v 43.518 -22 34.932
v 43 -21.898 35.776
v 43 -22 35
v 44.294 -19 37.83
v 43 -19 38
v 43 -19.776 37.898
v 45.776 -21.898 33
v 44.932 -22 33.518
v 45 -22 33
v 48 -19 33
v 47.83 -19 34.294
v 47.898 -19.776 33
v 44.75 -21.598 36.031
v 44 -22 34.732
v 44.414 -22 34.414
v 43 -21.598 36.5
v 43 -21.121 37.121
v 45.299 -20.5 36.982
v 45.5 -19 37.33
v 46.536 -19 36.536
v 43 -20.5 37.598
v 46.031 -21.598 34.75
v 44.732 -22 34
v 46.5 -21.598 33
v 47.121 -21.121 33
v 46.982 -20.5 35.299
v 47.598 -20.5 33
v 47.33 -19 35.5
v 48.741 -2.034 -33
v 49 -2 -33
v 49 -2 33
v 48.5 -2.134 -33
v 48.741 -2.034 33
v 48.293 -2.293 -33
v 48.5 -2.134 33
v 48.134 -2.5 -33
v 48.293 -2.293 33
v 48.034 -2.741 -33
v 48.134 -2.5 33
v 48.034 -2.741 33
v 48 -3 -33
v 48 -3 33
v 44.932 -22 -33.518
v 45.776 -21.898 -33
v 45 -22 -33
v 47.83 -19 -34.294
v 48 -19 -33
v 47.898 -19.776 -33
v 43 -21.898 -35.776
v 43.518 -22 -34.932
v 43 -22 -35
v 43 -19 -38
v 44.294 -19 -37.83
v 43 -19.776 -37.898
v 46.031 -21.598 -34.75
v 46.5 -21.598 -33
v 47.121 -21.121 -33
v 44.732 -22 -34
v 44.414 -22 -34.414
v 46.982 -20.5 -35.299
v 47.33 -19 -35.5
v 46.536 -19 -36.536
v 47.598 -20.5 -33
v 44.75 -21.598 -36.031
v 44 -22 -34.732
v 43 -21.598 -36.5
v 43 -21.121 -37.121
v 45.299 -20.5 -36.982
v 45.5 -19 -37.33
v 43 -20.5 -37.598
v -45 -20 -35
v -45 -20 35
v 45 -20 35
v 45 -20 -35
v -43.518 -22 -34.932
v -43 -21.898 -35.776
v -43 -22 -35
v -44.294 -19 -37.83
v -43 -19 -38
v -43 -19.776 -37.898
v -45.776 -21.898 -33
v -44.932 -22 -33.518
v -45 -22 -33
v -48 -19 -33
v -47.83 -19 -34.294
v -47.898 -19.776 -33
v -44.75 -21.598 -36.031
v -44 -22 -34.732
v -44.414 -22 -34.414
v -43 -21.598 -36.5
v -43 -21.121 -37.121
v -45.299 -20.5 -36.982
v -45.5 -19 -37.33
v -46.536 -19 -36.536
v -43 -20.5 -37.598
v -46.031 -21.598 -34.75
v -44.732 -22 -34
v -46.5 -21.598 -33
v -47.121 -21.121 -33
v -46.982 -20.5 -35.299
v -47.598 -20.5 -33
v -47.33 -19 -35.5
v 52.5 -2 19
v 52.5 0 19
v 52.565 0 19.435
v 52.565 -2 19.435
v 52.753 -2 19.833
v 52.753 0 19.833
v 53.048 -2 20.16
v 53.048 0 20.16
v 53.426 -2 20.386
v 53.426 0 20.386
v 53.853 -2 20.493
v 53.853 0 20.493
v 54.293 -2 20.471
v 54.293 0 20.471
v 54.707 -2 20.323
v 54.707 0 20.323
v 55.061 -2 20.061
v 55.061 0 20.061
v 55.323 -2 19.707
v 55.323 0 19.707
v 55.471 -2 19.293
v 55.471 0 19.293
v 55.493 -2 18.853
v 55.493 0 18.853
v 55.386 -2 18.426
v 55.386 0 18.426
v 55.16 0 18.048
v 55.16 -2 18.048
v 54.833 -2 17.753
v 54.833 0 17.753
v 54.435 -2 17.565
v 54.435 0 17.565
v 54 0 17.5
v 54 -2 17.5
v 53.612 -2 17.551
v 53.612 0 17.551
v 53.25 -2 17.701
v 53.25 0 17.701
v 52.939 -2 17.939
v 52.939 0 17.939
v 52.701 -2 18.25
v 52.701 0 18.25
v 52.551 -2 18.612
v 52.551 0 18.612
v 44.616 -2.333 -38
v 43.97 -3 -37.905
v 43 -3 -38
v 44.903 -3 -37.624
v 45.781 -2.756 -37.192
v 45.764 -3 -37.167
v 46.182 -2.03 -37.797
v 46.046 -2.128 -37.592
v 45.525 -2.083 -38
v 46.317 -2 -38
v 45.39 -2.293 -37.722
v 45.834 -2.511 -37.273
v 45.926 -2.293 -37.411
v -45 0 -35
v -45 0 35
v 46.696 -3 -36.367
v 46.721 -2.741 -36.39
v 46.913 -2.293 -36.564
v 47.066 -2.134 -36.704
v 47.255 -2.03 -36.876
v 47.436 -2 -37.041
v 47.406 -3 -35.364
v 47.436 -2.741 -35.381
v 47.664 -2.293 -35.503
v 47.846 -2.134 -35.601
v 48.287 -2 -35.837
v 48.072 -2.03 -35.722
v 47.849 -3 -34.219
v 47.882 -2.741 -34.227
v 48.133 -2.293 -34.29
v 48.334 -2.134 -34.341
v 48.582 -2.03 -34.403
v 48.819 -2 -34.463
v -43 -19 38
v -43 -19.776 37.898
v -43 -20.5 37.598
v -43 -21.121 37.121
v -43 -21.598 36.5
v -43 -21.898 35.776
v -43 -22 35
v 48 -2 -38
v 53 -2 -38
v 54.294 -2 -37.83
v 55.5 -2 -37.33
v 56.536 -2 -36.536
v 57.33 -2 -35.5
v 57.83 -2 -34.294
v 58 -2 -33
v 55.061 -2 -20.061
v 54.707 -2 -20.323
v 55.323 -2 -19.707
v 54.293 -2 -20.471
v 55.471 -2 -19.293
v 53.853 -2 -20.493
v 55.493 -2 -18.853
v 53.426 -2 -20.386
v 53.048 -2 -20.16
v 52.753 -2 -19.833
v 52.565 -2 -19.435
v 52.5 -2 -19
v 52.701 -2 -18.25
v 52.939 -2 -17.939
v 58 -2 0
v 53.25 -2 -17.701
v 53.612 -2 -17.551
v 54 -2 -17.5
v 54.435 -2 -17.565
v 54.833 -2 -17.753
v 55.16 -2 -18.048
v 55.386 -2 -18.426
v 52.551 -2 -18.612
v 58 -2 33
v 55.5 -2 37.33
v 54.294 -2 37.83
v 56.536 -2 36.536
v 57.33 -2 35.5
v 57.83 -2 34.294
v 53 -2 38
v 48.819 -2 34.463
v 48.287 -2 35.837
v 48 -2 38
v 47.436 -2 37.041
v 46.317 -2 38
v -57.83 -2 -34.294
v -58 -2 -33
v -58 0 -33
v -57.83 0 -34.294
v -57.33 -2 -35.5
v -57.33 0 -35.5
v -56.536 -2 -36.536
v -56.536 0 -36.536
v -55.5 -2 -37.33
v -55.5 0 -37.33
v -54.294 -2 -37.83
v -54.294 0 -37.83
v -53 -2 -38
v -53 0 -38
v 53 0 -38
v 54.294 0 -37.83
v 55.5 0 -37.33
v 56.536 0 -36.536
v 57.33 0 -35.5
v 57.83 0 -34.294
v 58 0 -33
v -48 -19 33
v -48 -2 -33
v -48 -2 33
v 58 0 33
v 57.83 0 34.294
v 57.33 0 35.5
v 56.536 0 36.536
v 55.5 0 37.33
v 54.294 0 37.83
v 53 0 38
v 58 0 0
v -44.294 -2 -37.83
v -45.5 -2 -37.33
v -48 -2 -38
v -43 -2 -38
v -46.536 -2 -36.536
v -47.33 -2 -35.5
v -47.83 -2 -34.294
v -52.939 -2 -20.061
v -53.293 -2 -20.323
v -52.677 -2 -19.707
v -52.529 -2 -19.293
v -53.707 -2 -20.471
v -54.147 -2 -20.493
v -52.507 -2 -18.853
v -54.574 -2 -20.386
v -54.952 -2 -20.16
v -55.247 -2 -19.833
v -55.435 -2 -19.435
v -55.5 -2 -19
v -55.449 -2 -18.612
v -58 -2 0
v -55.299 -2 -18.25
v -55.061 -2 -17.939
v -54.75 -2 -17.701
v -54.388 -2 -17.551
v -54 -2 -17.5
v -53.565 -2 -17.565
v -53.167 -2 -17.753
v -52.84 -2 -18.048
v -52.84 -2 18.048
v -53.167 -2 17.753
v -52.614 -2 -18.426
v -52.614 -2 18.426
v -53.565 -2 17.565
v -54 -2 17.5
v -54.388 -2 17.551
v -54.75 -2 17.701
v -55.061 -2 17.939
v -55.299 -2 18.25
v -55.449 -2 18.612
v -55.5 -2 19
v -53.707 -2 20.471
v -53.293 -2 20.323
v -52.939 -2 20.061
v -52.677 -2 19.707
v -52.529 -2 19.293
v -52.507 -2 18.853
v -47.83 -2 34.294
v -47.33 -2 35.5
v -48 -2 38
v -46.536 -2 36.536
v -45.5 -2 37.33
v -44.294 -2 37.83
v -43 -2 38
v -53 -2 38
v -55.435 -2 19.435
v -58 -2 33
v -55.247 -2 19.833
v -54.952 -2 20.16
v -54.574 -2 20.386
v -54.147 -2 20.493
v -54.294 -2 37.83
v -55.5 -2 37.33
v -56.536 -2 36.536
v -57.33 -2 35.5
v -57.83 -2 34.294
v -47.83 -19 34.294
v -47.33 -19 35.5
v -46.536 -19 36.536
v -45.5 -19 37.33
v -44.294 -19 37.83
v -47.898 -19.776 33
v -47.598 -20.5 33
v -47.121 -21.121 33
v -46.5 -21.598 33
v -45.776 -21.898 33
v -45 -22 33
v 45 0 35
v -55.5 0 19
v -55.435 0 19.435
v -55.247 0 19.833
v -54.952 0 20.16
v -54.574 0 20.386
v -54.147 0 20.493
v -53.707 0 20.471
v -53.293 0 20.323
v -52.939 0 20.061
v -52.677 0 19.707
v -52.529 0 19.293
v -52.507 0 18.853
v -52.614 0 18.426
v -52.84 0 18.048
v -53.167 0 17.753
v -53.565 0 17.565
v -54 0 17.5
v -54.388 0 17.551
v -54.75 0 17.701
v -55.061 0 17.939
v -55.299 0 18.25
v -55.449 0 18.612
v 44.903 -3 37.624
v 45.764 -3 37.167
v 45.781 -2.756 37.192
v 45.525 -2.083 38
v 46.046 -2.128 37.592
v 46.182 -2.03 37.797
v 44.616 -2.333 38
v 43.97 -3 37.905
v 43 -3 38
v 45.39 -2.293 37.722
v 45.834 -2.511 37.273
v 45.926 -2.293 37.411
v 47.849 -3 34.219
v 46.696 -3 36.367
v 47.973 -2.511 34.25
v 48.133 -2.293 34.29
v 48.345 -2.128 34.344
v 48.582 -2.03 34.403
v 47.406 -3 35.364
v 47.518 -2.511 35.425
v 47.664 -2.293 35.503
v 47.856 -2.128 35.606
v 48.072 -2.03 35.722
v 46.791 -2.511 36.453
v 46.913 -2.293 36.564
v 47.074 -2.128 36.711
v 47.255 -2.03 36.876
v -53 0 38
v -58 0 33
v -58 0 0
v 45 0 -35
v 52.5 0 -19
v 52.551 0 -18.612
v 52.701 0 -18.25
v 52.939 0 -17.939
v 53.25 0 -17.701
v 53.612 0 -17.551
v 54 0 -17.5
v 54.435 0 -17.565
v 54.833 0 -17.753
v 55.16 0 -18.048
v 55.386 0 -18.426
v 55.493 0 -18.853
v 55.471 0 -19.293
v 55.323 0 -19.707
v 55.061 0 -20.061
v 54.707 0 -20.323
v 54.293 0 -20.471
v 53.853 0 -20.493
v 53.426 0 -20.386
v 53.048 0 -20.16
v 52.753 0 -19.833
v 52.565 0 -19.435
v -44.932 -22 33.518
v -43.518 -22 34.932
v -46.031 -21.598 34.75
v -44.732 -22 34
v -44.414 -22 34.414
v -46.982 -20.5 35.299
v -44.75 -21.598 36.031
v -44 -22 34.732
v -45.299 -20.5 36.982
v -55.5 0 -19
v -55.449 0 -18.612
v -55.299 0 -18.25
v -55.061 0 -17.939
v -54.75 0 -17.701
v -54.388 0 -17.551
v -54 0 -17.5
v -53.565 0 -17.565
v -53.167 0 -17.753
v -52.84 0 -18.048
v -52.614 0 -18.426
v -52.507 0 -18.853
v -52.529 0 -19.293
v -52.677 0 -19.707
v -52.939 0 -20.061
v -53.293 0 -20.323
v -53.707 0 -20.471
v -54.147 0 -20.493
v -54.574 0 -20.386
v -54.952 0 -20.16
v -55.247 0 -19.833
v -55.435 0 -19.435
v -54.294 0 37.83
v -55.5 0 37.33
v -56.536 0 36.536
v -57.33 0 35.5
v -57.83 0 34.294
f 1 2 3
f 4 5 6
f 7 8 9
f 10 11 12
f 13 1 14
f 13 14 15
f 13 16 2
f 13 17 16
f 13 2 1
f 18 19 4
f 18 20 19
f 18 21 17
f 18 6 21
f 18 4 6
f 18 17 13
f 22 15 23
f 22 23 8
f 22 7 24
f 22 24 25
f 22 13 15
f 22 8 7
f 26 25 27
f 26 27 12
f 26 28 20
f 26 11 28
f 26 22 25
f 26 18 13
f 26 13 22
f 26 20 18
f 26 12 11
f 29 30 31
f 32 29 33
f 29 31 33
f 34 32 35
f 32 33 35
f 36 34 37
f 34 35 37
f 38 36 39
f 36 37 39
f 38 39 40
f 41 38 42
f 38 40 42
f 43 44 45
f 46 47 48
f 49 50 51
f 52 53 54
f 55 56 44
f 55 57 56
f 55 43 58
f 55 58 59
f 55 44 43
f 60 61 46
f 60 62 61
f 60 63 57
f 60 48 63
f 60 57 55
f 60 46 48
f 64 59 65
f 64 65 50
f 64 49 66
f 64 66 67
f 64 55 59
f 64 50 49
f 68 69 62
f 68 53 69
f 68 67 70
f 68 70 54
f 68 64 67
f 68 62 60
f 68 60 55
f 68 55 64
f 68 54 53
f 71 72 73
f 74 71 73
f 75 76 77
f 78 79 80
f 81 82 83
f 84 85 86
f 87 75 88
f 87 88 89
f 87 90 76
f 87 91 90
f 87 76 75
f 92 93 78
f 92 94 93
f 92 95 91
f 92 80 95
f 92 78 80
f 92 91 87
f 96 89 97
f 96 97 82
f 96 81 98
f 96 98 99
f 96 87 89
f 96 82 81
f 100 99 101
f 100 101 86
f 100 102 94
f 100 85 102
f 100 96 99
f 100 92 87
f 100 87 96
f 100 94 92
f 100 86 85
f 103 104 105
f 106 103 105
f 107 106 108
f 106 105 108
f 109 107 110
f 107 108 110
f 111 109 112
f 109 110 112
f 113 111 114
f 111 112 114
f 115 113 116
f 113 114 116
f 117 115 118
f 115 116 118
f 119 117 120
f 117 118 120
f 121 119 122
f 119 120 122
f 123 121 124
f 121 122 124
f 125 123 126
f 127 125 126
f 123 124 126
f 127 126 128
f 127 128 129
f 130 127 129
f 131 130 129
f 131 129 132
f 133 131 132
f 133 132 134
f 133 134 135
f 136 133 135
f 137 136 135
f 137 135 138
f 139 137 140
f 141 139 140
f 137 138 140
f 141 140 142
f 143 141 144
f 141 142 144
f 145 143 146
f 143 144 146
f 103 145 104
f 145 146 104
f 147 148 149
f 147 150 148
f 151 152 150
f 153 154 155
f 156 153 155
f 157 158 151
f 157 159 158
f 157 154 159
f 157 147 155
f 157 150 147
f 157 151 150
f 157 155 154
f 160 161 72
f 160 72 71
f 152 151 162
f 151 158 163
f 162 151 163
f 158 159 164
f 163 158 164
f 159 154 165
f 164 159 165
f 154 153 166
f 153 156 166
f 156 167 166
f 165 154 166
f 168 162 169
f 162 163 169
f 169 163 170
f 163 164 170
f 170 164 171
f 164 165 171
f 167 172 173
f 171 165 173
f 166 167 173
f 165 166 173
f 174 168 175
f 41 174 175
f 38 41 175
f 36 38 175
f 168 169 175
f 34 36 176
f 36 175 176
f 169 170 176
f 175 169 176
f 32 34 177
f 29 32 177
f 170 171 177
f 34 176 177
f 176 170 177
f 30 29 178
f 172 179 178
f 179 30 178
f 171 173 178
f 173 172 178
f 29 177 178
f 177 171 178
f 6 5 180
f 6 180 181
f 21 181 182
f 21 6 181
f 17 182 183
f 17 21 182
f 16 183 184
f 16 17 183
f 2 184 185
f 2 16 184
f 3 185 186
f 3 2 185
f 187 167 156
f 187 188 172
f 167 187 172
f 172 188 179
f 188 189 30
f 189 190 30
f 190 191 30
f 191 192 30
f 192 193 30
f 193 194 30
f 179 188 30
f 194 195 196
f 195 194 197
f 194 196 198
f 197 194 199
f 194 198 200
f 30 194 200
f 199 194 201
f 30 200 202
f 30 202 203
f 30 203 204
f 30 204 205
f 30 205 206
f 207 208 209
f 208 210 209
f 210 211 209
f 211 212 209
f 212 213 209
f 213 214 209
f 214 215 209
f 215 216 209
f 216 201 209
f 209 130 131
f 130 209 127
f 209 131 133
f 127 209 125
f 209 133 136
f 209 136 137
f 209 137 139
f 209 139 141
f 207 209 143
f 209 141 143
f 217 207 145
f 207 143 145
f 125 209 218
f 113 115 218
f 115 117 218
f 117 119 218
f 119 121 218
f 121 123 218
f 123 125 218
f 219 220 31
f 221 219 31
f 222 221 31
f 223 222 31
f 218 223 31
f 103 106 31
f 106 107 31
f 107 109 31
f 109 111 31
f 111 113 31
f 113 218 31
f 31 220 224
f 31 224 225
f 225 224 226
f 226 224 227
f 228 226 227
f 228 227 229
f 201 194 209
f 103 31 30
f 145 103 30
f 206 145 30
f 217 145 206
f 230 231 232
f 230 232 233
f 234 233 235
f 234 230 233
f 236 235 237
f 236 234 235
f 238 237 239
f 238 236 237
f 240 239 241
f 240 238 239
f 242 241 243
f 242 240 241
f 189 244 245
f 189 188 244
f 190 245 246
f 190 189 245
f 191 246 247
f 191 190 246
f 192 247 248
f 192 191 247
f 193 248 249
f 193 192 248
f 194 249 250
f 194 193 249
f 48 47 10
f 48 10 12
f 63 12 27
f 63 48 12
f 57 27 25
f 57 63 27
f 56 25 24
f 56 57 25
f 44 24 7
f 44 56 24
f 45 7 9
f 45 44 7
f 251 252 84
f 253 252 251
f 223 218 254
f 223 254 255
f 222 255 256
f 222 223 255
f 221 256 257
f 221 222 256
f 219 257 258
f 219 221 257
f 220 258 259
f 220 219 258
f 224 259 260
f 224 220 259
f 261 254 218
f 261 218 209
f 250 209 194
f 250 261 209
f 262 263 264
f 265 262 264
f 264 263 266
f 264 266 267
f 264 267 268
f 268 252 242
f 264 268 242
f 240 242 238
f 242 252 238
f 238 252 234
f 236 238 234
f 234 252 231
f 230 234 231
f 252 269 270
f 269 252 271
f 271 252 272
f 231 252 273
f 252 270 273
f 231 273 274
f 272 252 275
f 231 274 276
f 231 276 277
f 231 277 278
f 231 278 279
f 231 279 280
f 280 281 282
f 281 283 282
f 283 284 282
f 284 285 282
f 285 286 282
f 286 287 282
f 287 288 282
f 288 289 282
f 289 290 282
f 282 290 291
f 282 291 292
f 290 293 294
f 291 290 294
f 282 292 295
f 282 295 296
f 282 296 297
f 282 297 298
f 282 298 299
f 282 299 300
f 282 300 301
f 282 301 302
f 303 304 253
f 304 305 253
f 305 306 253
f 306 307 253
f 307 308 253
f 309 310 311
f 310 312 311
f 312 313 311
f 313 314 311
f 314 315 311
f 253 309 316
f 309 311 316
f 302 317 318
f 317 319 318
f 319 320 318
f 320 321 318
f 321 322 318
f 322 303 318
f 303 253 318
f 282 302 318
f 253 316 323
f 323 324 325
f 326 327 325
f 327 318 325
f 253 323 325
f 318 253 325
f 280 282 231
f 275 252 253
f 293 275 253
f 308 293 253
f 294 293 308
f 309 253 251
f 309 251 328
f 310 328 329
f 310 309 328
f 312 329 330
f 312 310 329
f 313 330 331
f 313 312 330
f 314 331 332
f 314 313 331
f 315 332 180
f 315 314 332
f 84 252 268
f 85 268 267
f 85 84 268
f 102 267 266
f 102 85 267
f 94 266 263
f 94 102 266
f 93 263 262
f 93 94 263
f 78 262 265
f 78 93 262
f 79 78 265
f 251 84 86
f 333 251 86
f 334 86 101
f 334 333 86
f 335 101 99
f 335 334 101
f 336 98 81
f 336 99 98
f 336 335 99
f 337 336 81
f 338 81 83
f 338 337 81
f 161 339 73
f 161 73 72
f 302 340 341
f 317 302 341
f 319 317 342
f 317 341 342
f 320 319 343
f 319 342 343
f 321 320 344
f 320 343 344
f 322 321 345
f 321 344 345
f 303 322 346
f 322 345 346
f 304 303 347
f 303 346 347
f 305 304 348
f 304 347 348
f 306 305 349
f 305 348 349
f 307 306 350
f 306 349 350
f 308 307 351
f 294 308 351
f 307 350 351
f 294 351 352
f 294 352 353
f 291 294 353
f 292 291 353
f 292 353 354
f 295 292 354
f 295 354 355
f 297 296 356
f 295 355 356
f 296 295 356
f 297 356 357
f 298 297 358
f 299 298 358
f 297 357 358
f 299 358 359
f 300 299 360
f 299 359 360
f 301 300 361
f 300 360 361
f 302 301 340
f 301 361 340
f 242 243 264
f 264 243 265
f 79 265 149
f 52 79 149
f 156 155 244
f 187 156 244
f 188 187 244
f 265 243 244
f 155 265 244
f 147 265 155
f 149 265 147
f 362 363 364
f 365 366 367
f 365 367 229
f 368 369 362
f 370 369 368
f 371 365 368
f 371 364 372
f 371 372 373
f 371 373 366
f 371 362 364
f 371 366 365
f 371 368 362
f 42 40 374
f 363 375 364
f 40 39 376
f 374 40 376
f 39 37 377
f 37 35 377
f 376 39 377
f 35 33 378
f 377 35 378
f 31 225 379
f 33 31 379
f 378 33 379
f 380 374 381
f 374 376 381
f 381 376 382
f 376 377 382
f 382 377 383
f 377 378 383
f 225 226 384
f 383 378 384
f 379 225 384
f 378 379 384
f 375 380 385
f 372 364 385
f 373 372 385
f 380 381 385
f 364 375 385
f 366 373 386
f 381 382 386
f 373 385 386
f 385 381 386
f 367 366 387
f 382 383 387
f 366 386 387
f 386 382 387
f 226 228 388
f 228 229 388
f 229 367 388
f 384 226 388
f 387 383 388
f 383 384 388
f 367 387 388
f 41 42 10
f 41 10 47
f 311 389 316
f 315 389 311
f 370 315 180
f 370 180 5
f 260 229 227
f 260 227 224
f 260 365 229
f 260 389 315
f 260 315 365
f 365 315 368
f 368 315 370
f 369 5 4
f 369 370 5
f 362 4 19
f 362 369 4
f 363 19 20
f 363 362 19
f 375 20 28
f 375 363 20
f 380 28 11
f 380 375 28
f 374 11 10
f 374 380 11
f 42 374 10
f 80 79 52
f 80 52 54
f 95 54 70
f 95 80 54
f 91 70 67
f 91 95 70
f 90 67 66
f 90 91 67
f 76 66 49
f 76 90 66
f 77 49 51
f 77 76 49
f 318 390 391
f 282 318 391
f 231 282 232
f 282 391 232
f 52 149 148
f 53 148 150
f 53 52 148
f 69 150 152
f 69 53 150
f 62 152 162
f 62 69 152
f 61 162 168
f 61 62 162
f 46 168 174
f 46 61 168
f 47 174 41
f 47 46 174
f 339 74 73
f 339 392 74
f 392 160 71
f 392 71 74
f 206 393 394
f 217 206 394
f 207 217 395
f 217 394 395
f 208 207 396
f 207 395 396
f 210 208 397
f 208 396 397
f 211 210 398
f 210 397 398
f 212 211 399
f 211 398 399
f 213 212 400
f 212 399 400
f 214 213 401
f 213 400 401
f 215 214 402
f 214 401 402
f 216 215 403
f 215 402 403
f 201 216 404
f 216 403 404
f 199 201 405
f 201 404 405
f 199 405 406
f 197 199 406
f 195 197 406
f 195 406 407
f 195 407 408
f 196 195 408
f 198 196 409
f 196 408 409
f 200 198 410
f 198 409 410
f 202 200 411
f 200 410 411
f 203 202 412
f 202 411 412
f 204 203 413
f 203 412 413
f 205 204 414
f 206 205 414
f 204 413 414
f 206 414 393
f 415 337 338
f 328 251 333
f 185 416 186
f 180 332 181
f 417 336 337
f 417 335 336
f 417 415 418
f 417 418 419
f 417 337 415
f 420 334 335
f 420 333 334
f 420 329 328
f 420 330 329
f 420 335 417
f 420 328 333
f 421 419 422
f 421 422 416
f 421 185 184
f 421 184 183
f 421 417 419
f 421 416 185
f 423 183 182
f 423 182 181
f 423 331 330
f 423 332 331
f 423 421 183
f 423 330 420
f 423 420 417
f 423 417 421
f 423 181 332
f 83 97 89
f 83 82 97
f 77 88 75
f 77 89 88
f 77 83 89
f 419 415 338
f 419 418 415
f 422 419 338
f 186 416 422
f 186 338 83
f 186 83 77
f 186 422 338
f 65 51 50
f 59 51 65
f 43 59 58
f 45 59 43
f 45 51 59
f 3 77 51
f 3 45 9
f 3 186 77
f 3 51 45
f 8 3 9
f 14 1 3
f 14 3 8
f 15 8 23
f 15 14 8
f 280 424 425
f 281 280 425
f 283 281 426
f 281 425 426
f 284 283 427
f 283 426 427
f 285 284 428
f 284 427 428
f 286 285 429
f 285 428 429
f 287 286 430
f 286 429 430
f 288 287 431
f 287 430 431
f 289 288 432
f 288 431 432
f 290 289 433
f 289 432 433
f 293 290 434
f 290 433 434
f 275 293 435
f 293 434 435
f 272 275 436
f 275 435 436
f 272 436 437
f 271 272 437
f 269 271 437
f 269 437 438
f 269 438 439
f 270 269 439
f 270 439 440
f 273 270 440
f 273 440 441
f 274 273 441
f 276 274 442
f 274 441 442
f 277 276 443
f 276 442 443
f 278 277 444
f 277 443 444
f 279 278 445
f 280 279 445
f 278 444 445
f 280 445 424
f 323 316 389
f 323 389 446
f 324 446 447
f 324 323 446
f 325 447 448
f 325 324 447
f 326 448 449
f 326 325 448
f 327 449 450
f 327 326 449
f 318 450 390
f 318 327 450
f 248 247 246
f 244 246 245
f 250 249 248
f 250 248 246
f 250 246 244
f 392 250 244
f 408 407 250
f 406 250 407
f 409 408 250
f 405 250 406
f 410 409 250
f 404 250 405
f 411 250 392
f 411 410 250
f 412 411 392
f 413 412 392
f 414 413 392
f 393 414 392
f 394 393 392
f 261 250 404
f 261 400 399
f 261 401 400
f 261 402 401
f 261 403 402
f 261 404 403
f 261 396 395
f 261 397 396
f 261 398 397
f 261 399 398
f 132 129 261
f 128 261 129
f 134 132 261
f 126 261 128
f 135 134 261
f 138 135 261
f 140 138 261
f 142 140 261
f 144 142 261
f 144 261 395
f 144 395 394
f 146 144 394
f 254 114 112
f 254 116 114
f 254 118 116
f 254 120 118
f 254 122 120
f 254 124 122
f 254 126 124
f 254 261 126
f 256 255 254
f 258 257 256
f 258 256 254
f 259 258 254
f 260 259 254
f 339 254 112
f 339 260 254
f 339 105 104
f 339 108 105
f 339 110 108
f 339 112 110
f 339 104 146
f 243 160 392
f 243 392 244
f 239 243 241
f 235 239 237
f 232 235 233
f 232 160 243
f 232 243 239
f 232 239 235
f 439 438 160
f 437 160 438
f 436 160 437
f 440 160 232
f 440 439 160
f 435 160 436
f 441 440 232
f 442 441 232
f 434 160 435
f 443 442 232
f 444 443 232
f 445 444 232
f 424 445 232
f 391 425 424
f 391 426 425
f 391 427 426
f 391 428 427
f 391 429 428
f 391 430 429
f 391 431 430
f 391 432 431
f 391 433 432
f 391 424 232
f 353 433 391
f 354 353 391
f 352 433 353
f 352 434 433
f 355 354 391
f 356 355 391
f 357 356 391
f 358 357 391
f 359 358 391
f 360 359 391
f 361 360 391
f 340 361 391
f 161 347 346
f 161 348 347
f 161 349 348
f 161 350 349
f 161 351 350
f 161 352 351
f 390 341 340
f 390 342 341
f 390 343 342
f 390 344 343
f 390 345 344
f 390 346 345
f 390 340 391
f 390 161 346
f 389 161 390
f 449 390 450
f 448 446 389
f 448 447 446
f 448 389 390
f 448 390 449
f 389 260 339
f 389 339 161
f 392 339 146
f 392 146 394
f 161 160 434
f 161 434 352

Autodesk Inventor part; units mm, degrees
ref_plane "YZ Plane" through (0, 0, 0) normal (1, 0, 0) x (0, 1, 0)
ref_plane "XZ Plane" through (0, 0, 0) normal (0, 1, 0) x (-1, 0, 0)
ref_plane "XY Plane" through (0, 0, 0) normal (0, 0, 1) x (1, 0, 0)
sketch "Sketch1" plane through (0, 0, 0) normal (0, 1, 0) x (-1, 0, 0)
  line L0 (-45, 35) -> (45, 35)
  line L1 (45, 35) -> (45, -35)
  line L2 (45, -35) -> (-45, -35)
  line L3 (-45, -35) -> (-45, 35)
  line L4 (-45, 35) -> (45, -35) construction
  line L5 (45, 35) -> (-45, -35) construction
  line L6 (-48, 38) -> (48, 38)
  line L7 (48, 38) -> (48, -38)
  line L8 (48, -38) -> (-48, -38)
  line L9 (-48, -38) -> (-48, 38)
  line L10 (-48, 38) -> (48, -38) construction
  line L11 (48, 38) -> (-48, -38) construction
  line L12 (48, 38) -> (58, 38)
  line L13 (58, 38) -> (58, -38)
  line L14 (58, -38) -> (48, -38)
  line L15 (48, -38) -> (48, 38)
  line L16 (-48, 38) -> (-58, 38)
  line L17 (-58, 38) -> (-58, -38)
  line L18 (-58, -38) -> (-48, -38)
  line L19 (-48, -38) -> (-48, 38)
  line L20 (54, -19) -> (54, 19)
  line L21 (54, -19) -> (92, -19) construction
  circle A0 centre (54, 19) radius 1.5
  circle A1 centre (54, -19) radius 1.5
  line L22 (-54, -19) -> (-54, 19)
  circle A2 centre (-54, 19) radius 1.5
  circle A3 centre (-54, -19) radius 1.5
  line L23 (58, 0) -> (54, 0)
  line L24 (-58, 0) -> (-54, 0)
  point P0 (0, 0)
  point P1 (54, 0)
  dimension "d0" = 90
  dimension "d1" = 70
  dimension "d2" = 96
  dimension "d3" = 76
  dimension "d4" = 10
  dimension "d5" = 76
  dimension "d6" = 10
  dimension "d7" = 76
  dimension "d8" = 38
  dimension "d9" = 90
  dimension "d10" = 3
  dimension "d11" = 3
  dimension "d12" = 3
  dimension "d13" = 3
  dimension "d23" = 4
  dimension "d24" = 4
extrude "Extrusion1" add sketch "Sketch1" against normal blind 20 contours L6 L7 L8 L9
extrude "Extrusion2" add sketch "Sketch1" against normal blind 2 contours L9 L18 L17 L16 | L12 L13 L14 L7
sketch "Sketch2" plane through (0, -20, 0) normal (0, -1, 0) x (1, 0, 0)
  line L0 (-48, -38) -> (48, -38) projected
  line L1 (-48, 38) -> (48, 38)
  line L2 (48, 38) -> (48, -38)
  line L3 (48, -38) -> (-48, -38)
  line L4 (-48, -38) -> (-48, 38)
  line L5 (-48, 38) -> (48, -38) construction
  line L6 (48, 38) -> (-48, -38) construction
  point P0 (0, 0)
extrude "Extrusion3" add sketch "Sketch2" along normal blind 2
fillet "Fillet1" radius 5 8 edges at (48, -12, -38) (-48, -12, -38) (48, -12, 38) (-48, -12, 38) (-58, -1, 38) (-58, -1, -38) (58, -1, -38) (58, -1, 38)
fillet "Fillet2" radius 1 1 edges at (48, -2, 0)
fillet "Fillet3" radius 3 8 edges at (-46.5355, -22, 36.5355) (-48, -22, 0) (-46.5355, -22, -36.5355) (0, -22, -38) (46.5355, -22, -36.5355) (48, -22, 0) (46.5355, -22, 36.5355) (0, -22, 38)
properties part number "battary holder"
